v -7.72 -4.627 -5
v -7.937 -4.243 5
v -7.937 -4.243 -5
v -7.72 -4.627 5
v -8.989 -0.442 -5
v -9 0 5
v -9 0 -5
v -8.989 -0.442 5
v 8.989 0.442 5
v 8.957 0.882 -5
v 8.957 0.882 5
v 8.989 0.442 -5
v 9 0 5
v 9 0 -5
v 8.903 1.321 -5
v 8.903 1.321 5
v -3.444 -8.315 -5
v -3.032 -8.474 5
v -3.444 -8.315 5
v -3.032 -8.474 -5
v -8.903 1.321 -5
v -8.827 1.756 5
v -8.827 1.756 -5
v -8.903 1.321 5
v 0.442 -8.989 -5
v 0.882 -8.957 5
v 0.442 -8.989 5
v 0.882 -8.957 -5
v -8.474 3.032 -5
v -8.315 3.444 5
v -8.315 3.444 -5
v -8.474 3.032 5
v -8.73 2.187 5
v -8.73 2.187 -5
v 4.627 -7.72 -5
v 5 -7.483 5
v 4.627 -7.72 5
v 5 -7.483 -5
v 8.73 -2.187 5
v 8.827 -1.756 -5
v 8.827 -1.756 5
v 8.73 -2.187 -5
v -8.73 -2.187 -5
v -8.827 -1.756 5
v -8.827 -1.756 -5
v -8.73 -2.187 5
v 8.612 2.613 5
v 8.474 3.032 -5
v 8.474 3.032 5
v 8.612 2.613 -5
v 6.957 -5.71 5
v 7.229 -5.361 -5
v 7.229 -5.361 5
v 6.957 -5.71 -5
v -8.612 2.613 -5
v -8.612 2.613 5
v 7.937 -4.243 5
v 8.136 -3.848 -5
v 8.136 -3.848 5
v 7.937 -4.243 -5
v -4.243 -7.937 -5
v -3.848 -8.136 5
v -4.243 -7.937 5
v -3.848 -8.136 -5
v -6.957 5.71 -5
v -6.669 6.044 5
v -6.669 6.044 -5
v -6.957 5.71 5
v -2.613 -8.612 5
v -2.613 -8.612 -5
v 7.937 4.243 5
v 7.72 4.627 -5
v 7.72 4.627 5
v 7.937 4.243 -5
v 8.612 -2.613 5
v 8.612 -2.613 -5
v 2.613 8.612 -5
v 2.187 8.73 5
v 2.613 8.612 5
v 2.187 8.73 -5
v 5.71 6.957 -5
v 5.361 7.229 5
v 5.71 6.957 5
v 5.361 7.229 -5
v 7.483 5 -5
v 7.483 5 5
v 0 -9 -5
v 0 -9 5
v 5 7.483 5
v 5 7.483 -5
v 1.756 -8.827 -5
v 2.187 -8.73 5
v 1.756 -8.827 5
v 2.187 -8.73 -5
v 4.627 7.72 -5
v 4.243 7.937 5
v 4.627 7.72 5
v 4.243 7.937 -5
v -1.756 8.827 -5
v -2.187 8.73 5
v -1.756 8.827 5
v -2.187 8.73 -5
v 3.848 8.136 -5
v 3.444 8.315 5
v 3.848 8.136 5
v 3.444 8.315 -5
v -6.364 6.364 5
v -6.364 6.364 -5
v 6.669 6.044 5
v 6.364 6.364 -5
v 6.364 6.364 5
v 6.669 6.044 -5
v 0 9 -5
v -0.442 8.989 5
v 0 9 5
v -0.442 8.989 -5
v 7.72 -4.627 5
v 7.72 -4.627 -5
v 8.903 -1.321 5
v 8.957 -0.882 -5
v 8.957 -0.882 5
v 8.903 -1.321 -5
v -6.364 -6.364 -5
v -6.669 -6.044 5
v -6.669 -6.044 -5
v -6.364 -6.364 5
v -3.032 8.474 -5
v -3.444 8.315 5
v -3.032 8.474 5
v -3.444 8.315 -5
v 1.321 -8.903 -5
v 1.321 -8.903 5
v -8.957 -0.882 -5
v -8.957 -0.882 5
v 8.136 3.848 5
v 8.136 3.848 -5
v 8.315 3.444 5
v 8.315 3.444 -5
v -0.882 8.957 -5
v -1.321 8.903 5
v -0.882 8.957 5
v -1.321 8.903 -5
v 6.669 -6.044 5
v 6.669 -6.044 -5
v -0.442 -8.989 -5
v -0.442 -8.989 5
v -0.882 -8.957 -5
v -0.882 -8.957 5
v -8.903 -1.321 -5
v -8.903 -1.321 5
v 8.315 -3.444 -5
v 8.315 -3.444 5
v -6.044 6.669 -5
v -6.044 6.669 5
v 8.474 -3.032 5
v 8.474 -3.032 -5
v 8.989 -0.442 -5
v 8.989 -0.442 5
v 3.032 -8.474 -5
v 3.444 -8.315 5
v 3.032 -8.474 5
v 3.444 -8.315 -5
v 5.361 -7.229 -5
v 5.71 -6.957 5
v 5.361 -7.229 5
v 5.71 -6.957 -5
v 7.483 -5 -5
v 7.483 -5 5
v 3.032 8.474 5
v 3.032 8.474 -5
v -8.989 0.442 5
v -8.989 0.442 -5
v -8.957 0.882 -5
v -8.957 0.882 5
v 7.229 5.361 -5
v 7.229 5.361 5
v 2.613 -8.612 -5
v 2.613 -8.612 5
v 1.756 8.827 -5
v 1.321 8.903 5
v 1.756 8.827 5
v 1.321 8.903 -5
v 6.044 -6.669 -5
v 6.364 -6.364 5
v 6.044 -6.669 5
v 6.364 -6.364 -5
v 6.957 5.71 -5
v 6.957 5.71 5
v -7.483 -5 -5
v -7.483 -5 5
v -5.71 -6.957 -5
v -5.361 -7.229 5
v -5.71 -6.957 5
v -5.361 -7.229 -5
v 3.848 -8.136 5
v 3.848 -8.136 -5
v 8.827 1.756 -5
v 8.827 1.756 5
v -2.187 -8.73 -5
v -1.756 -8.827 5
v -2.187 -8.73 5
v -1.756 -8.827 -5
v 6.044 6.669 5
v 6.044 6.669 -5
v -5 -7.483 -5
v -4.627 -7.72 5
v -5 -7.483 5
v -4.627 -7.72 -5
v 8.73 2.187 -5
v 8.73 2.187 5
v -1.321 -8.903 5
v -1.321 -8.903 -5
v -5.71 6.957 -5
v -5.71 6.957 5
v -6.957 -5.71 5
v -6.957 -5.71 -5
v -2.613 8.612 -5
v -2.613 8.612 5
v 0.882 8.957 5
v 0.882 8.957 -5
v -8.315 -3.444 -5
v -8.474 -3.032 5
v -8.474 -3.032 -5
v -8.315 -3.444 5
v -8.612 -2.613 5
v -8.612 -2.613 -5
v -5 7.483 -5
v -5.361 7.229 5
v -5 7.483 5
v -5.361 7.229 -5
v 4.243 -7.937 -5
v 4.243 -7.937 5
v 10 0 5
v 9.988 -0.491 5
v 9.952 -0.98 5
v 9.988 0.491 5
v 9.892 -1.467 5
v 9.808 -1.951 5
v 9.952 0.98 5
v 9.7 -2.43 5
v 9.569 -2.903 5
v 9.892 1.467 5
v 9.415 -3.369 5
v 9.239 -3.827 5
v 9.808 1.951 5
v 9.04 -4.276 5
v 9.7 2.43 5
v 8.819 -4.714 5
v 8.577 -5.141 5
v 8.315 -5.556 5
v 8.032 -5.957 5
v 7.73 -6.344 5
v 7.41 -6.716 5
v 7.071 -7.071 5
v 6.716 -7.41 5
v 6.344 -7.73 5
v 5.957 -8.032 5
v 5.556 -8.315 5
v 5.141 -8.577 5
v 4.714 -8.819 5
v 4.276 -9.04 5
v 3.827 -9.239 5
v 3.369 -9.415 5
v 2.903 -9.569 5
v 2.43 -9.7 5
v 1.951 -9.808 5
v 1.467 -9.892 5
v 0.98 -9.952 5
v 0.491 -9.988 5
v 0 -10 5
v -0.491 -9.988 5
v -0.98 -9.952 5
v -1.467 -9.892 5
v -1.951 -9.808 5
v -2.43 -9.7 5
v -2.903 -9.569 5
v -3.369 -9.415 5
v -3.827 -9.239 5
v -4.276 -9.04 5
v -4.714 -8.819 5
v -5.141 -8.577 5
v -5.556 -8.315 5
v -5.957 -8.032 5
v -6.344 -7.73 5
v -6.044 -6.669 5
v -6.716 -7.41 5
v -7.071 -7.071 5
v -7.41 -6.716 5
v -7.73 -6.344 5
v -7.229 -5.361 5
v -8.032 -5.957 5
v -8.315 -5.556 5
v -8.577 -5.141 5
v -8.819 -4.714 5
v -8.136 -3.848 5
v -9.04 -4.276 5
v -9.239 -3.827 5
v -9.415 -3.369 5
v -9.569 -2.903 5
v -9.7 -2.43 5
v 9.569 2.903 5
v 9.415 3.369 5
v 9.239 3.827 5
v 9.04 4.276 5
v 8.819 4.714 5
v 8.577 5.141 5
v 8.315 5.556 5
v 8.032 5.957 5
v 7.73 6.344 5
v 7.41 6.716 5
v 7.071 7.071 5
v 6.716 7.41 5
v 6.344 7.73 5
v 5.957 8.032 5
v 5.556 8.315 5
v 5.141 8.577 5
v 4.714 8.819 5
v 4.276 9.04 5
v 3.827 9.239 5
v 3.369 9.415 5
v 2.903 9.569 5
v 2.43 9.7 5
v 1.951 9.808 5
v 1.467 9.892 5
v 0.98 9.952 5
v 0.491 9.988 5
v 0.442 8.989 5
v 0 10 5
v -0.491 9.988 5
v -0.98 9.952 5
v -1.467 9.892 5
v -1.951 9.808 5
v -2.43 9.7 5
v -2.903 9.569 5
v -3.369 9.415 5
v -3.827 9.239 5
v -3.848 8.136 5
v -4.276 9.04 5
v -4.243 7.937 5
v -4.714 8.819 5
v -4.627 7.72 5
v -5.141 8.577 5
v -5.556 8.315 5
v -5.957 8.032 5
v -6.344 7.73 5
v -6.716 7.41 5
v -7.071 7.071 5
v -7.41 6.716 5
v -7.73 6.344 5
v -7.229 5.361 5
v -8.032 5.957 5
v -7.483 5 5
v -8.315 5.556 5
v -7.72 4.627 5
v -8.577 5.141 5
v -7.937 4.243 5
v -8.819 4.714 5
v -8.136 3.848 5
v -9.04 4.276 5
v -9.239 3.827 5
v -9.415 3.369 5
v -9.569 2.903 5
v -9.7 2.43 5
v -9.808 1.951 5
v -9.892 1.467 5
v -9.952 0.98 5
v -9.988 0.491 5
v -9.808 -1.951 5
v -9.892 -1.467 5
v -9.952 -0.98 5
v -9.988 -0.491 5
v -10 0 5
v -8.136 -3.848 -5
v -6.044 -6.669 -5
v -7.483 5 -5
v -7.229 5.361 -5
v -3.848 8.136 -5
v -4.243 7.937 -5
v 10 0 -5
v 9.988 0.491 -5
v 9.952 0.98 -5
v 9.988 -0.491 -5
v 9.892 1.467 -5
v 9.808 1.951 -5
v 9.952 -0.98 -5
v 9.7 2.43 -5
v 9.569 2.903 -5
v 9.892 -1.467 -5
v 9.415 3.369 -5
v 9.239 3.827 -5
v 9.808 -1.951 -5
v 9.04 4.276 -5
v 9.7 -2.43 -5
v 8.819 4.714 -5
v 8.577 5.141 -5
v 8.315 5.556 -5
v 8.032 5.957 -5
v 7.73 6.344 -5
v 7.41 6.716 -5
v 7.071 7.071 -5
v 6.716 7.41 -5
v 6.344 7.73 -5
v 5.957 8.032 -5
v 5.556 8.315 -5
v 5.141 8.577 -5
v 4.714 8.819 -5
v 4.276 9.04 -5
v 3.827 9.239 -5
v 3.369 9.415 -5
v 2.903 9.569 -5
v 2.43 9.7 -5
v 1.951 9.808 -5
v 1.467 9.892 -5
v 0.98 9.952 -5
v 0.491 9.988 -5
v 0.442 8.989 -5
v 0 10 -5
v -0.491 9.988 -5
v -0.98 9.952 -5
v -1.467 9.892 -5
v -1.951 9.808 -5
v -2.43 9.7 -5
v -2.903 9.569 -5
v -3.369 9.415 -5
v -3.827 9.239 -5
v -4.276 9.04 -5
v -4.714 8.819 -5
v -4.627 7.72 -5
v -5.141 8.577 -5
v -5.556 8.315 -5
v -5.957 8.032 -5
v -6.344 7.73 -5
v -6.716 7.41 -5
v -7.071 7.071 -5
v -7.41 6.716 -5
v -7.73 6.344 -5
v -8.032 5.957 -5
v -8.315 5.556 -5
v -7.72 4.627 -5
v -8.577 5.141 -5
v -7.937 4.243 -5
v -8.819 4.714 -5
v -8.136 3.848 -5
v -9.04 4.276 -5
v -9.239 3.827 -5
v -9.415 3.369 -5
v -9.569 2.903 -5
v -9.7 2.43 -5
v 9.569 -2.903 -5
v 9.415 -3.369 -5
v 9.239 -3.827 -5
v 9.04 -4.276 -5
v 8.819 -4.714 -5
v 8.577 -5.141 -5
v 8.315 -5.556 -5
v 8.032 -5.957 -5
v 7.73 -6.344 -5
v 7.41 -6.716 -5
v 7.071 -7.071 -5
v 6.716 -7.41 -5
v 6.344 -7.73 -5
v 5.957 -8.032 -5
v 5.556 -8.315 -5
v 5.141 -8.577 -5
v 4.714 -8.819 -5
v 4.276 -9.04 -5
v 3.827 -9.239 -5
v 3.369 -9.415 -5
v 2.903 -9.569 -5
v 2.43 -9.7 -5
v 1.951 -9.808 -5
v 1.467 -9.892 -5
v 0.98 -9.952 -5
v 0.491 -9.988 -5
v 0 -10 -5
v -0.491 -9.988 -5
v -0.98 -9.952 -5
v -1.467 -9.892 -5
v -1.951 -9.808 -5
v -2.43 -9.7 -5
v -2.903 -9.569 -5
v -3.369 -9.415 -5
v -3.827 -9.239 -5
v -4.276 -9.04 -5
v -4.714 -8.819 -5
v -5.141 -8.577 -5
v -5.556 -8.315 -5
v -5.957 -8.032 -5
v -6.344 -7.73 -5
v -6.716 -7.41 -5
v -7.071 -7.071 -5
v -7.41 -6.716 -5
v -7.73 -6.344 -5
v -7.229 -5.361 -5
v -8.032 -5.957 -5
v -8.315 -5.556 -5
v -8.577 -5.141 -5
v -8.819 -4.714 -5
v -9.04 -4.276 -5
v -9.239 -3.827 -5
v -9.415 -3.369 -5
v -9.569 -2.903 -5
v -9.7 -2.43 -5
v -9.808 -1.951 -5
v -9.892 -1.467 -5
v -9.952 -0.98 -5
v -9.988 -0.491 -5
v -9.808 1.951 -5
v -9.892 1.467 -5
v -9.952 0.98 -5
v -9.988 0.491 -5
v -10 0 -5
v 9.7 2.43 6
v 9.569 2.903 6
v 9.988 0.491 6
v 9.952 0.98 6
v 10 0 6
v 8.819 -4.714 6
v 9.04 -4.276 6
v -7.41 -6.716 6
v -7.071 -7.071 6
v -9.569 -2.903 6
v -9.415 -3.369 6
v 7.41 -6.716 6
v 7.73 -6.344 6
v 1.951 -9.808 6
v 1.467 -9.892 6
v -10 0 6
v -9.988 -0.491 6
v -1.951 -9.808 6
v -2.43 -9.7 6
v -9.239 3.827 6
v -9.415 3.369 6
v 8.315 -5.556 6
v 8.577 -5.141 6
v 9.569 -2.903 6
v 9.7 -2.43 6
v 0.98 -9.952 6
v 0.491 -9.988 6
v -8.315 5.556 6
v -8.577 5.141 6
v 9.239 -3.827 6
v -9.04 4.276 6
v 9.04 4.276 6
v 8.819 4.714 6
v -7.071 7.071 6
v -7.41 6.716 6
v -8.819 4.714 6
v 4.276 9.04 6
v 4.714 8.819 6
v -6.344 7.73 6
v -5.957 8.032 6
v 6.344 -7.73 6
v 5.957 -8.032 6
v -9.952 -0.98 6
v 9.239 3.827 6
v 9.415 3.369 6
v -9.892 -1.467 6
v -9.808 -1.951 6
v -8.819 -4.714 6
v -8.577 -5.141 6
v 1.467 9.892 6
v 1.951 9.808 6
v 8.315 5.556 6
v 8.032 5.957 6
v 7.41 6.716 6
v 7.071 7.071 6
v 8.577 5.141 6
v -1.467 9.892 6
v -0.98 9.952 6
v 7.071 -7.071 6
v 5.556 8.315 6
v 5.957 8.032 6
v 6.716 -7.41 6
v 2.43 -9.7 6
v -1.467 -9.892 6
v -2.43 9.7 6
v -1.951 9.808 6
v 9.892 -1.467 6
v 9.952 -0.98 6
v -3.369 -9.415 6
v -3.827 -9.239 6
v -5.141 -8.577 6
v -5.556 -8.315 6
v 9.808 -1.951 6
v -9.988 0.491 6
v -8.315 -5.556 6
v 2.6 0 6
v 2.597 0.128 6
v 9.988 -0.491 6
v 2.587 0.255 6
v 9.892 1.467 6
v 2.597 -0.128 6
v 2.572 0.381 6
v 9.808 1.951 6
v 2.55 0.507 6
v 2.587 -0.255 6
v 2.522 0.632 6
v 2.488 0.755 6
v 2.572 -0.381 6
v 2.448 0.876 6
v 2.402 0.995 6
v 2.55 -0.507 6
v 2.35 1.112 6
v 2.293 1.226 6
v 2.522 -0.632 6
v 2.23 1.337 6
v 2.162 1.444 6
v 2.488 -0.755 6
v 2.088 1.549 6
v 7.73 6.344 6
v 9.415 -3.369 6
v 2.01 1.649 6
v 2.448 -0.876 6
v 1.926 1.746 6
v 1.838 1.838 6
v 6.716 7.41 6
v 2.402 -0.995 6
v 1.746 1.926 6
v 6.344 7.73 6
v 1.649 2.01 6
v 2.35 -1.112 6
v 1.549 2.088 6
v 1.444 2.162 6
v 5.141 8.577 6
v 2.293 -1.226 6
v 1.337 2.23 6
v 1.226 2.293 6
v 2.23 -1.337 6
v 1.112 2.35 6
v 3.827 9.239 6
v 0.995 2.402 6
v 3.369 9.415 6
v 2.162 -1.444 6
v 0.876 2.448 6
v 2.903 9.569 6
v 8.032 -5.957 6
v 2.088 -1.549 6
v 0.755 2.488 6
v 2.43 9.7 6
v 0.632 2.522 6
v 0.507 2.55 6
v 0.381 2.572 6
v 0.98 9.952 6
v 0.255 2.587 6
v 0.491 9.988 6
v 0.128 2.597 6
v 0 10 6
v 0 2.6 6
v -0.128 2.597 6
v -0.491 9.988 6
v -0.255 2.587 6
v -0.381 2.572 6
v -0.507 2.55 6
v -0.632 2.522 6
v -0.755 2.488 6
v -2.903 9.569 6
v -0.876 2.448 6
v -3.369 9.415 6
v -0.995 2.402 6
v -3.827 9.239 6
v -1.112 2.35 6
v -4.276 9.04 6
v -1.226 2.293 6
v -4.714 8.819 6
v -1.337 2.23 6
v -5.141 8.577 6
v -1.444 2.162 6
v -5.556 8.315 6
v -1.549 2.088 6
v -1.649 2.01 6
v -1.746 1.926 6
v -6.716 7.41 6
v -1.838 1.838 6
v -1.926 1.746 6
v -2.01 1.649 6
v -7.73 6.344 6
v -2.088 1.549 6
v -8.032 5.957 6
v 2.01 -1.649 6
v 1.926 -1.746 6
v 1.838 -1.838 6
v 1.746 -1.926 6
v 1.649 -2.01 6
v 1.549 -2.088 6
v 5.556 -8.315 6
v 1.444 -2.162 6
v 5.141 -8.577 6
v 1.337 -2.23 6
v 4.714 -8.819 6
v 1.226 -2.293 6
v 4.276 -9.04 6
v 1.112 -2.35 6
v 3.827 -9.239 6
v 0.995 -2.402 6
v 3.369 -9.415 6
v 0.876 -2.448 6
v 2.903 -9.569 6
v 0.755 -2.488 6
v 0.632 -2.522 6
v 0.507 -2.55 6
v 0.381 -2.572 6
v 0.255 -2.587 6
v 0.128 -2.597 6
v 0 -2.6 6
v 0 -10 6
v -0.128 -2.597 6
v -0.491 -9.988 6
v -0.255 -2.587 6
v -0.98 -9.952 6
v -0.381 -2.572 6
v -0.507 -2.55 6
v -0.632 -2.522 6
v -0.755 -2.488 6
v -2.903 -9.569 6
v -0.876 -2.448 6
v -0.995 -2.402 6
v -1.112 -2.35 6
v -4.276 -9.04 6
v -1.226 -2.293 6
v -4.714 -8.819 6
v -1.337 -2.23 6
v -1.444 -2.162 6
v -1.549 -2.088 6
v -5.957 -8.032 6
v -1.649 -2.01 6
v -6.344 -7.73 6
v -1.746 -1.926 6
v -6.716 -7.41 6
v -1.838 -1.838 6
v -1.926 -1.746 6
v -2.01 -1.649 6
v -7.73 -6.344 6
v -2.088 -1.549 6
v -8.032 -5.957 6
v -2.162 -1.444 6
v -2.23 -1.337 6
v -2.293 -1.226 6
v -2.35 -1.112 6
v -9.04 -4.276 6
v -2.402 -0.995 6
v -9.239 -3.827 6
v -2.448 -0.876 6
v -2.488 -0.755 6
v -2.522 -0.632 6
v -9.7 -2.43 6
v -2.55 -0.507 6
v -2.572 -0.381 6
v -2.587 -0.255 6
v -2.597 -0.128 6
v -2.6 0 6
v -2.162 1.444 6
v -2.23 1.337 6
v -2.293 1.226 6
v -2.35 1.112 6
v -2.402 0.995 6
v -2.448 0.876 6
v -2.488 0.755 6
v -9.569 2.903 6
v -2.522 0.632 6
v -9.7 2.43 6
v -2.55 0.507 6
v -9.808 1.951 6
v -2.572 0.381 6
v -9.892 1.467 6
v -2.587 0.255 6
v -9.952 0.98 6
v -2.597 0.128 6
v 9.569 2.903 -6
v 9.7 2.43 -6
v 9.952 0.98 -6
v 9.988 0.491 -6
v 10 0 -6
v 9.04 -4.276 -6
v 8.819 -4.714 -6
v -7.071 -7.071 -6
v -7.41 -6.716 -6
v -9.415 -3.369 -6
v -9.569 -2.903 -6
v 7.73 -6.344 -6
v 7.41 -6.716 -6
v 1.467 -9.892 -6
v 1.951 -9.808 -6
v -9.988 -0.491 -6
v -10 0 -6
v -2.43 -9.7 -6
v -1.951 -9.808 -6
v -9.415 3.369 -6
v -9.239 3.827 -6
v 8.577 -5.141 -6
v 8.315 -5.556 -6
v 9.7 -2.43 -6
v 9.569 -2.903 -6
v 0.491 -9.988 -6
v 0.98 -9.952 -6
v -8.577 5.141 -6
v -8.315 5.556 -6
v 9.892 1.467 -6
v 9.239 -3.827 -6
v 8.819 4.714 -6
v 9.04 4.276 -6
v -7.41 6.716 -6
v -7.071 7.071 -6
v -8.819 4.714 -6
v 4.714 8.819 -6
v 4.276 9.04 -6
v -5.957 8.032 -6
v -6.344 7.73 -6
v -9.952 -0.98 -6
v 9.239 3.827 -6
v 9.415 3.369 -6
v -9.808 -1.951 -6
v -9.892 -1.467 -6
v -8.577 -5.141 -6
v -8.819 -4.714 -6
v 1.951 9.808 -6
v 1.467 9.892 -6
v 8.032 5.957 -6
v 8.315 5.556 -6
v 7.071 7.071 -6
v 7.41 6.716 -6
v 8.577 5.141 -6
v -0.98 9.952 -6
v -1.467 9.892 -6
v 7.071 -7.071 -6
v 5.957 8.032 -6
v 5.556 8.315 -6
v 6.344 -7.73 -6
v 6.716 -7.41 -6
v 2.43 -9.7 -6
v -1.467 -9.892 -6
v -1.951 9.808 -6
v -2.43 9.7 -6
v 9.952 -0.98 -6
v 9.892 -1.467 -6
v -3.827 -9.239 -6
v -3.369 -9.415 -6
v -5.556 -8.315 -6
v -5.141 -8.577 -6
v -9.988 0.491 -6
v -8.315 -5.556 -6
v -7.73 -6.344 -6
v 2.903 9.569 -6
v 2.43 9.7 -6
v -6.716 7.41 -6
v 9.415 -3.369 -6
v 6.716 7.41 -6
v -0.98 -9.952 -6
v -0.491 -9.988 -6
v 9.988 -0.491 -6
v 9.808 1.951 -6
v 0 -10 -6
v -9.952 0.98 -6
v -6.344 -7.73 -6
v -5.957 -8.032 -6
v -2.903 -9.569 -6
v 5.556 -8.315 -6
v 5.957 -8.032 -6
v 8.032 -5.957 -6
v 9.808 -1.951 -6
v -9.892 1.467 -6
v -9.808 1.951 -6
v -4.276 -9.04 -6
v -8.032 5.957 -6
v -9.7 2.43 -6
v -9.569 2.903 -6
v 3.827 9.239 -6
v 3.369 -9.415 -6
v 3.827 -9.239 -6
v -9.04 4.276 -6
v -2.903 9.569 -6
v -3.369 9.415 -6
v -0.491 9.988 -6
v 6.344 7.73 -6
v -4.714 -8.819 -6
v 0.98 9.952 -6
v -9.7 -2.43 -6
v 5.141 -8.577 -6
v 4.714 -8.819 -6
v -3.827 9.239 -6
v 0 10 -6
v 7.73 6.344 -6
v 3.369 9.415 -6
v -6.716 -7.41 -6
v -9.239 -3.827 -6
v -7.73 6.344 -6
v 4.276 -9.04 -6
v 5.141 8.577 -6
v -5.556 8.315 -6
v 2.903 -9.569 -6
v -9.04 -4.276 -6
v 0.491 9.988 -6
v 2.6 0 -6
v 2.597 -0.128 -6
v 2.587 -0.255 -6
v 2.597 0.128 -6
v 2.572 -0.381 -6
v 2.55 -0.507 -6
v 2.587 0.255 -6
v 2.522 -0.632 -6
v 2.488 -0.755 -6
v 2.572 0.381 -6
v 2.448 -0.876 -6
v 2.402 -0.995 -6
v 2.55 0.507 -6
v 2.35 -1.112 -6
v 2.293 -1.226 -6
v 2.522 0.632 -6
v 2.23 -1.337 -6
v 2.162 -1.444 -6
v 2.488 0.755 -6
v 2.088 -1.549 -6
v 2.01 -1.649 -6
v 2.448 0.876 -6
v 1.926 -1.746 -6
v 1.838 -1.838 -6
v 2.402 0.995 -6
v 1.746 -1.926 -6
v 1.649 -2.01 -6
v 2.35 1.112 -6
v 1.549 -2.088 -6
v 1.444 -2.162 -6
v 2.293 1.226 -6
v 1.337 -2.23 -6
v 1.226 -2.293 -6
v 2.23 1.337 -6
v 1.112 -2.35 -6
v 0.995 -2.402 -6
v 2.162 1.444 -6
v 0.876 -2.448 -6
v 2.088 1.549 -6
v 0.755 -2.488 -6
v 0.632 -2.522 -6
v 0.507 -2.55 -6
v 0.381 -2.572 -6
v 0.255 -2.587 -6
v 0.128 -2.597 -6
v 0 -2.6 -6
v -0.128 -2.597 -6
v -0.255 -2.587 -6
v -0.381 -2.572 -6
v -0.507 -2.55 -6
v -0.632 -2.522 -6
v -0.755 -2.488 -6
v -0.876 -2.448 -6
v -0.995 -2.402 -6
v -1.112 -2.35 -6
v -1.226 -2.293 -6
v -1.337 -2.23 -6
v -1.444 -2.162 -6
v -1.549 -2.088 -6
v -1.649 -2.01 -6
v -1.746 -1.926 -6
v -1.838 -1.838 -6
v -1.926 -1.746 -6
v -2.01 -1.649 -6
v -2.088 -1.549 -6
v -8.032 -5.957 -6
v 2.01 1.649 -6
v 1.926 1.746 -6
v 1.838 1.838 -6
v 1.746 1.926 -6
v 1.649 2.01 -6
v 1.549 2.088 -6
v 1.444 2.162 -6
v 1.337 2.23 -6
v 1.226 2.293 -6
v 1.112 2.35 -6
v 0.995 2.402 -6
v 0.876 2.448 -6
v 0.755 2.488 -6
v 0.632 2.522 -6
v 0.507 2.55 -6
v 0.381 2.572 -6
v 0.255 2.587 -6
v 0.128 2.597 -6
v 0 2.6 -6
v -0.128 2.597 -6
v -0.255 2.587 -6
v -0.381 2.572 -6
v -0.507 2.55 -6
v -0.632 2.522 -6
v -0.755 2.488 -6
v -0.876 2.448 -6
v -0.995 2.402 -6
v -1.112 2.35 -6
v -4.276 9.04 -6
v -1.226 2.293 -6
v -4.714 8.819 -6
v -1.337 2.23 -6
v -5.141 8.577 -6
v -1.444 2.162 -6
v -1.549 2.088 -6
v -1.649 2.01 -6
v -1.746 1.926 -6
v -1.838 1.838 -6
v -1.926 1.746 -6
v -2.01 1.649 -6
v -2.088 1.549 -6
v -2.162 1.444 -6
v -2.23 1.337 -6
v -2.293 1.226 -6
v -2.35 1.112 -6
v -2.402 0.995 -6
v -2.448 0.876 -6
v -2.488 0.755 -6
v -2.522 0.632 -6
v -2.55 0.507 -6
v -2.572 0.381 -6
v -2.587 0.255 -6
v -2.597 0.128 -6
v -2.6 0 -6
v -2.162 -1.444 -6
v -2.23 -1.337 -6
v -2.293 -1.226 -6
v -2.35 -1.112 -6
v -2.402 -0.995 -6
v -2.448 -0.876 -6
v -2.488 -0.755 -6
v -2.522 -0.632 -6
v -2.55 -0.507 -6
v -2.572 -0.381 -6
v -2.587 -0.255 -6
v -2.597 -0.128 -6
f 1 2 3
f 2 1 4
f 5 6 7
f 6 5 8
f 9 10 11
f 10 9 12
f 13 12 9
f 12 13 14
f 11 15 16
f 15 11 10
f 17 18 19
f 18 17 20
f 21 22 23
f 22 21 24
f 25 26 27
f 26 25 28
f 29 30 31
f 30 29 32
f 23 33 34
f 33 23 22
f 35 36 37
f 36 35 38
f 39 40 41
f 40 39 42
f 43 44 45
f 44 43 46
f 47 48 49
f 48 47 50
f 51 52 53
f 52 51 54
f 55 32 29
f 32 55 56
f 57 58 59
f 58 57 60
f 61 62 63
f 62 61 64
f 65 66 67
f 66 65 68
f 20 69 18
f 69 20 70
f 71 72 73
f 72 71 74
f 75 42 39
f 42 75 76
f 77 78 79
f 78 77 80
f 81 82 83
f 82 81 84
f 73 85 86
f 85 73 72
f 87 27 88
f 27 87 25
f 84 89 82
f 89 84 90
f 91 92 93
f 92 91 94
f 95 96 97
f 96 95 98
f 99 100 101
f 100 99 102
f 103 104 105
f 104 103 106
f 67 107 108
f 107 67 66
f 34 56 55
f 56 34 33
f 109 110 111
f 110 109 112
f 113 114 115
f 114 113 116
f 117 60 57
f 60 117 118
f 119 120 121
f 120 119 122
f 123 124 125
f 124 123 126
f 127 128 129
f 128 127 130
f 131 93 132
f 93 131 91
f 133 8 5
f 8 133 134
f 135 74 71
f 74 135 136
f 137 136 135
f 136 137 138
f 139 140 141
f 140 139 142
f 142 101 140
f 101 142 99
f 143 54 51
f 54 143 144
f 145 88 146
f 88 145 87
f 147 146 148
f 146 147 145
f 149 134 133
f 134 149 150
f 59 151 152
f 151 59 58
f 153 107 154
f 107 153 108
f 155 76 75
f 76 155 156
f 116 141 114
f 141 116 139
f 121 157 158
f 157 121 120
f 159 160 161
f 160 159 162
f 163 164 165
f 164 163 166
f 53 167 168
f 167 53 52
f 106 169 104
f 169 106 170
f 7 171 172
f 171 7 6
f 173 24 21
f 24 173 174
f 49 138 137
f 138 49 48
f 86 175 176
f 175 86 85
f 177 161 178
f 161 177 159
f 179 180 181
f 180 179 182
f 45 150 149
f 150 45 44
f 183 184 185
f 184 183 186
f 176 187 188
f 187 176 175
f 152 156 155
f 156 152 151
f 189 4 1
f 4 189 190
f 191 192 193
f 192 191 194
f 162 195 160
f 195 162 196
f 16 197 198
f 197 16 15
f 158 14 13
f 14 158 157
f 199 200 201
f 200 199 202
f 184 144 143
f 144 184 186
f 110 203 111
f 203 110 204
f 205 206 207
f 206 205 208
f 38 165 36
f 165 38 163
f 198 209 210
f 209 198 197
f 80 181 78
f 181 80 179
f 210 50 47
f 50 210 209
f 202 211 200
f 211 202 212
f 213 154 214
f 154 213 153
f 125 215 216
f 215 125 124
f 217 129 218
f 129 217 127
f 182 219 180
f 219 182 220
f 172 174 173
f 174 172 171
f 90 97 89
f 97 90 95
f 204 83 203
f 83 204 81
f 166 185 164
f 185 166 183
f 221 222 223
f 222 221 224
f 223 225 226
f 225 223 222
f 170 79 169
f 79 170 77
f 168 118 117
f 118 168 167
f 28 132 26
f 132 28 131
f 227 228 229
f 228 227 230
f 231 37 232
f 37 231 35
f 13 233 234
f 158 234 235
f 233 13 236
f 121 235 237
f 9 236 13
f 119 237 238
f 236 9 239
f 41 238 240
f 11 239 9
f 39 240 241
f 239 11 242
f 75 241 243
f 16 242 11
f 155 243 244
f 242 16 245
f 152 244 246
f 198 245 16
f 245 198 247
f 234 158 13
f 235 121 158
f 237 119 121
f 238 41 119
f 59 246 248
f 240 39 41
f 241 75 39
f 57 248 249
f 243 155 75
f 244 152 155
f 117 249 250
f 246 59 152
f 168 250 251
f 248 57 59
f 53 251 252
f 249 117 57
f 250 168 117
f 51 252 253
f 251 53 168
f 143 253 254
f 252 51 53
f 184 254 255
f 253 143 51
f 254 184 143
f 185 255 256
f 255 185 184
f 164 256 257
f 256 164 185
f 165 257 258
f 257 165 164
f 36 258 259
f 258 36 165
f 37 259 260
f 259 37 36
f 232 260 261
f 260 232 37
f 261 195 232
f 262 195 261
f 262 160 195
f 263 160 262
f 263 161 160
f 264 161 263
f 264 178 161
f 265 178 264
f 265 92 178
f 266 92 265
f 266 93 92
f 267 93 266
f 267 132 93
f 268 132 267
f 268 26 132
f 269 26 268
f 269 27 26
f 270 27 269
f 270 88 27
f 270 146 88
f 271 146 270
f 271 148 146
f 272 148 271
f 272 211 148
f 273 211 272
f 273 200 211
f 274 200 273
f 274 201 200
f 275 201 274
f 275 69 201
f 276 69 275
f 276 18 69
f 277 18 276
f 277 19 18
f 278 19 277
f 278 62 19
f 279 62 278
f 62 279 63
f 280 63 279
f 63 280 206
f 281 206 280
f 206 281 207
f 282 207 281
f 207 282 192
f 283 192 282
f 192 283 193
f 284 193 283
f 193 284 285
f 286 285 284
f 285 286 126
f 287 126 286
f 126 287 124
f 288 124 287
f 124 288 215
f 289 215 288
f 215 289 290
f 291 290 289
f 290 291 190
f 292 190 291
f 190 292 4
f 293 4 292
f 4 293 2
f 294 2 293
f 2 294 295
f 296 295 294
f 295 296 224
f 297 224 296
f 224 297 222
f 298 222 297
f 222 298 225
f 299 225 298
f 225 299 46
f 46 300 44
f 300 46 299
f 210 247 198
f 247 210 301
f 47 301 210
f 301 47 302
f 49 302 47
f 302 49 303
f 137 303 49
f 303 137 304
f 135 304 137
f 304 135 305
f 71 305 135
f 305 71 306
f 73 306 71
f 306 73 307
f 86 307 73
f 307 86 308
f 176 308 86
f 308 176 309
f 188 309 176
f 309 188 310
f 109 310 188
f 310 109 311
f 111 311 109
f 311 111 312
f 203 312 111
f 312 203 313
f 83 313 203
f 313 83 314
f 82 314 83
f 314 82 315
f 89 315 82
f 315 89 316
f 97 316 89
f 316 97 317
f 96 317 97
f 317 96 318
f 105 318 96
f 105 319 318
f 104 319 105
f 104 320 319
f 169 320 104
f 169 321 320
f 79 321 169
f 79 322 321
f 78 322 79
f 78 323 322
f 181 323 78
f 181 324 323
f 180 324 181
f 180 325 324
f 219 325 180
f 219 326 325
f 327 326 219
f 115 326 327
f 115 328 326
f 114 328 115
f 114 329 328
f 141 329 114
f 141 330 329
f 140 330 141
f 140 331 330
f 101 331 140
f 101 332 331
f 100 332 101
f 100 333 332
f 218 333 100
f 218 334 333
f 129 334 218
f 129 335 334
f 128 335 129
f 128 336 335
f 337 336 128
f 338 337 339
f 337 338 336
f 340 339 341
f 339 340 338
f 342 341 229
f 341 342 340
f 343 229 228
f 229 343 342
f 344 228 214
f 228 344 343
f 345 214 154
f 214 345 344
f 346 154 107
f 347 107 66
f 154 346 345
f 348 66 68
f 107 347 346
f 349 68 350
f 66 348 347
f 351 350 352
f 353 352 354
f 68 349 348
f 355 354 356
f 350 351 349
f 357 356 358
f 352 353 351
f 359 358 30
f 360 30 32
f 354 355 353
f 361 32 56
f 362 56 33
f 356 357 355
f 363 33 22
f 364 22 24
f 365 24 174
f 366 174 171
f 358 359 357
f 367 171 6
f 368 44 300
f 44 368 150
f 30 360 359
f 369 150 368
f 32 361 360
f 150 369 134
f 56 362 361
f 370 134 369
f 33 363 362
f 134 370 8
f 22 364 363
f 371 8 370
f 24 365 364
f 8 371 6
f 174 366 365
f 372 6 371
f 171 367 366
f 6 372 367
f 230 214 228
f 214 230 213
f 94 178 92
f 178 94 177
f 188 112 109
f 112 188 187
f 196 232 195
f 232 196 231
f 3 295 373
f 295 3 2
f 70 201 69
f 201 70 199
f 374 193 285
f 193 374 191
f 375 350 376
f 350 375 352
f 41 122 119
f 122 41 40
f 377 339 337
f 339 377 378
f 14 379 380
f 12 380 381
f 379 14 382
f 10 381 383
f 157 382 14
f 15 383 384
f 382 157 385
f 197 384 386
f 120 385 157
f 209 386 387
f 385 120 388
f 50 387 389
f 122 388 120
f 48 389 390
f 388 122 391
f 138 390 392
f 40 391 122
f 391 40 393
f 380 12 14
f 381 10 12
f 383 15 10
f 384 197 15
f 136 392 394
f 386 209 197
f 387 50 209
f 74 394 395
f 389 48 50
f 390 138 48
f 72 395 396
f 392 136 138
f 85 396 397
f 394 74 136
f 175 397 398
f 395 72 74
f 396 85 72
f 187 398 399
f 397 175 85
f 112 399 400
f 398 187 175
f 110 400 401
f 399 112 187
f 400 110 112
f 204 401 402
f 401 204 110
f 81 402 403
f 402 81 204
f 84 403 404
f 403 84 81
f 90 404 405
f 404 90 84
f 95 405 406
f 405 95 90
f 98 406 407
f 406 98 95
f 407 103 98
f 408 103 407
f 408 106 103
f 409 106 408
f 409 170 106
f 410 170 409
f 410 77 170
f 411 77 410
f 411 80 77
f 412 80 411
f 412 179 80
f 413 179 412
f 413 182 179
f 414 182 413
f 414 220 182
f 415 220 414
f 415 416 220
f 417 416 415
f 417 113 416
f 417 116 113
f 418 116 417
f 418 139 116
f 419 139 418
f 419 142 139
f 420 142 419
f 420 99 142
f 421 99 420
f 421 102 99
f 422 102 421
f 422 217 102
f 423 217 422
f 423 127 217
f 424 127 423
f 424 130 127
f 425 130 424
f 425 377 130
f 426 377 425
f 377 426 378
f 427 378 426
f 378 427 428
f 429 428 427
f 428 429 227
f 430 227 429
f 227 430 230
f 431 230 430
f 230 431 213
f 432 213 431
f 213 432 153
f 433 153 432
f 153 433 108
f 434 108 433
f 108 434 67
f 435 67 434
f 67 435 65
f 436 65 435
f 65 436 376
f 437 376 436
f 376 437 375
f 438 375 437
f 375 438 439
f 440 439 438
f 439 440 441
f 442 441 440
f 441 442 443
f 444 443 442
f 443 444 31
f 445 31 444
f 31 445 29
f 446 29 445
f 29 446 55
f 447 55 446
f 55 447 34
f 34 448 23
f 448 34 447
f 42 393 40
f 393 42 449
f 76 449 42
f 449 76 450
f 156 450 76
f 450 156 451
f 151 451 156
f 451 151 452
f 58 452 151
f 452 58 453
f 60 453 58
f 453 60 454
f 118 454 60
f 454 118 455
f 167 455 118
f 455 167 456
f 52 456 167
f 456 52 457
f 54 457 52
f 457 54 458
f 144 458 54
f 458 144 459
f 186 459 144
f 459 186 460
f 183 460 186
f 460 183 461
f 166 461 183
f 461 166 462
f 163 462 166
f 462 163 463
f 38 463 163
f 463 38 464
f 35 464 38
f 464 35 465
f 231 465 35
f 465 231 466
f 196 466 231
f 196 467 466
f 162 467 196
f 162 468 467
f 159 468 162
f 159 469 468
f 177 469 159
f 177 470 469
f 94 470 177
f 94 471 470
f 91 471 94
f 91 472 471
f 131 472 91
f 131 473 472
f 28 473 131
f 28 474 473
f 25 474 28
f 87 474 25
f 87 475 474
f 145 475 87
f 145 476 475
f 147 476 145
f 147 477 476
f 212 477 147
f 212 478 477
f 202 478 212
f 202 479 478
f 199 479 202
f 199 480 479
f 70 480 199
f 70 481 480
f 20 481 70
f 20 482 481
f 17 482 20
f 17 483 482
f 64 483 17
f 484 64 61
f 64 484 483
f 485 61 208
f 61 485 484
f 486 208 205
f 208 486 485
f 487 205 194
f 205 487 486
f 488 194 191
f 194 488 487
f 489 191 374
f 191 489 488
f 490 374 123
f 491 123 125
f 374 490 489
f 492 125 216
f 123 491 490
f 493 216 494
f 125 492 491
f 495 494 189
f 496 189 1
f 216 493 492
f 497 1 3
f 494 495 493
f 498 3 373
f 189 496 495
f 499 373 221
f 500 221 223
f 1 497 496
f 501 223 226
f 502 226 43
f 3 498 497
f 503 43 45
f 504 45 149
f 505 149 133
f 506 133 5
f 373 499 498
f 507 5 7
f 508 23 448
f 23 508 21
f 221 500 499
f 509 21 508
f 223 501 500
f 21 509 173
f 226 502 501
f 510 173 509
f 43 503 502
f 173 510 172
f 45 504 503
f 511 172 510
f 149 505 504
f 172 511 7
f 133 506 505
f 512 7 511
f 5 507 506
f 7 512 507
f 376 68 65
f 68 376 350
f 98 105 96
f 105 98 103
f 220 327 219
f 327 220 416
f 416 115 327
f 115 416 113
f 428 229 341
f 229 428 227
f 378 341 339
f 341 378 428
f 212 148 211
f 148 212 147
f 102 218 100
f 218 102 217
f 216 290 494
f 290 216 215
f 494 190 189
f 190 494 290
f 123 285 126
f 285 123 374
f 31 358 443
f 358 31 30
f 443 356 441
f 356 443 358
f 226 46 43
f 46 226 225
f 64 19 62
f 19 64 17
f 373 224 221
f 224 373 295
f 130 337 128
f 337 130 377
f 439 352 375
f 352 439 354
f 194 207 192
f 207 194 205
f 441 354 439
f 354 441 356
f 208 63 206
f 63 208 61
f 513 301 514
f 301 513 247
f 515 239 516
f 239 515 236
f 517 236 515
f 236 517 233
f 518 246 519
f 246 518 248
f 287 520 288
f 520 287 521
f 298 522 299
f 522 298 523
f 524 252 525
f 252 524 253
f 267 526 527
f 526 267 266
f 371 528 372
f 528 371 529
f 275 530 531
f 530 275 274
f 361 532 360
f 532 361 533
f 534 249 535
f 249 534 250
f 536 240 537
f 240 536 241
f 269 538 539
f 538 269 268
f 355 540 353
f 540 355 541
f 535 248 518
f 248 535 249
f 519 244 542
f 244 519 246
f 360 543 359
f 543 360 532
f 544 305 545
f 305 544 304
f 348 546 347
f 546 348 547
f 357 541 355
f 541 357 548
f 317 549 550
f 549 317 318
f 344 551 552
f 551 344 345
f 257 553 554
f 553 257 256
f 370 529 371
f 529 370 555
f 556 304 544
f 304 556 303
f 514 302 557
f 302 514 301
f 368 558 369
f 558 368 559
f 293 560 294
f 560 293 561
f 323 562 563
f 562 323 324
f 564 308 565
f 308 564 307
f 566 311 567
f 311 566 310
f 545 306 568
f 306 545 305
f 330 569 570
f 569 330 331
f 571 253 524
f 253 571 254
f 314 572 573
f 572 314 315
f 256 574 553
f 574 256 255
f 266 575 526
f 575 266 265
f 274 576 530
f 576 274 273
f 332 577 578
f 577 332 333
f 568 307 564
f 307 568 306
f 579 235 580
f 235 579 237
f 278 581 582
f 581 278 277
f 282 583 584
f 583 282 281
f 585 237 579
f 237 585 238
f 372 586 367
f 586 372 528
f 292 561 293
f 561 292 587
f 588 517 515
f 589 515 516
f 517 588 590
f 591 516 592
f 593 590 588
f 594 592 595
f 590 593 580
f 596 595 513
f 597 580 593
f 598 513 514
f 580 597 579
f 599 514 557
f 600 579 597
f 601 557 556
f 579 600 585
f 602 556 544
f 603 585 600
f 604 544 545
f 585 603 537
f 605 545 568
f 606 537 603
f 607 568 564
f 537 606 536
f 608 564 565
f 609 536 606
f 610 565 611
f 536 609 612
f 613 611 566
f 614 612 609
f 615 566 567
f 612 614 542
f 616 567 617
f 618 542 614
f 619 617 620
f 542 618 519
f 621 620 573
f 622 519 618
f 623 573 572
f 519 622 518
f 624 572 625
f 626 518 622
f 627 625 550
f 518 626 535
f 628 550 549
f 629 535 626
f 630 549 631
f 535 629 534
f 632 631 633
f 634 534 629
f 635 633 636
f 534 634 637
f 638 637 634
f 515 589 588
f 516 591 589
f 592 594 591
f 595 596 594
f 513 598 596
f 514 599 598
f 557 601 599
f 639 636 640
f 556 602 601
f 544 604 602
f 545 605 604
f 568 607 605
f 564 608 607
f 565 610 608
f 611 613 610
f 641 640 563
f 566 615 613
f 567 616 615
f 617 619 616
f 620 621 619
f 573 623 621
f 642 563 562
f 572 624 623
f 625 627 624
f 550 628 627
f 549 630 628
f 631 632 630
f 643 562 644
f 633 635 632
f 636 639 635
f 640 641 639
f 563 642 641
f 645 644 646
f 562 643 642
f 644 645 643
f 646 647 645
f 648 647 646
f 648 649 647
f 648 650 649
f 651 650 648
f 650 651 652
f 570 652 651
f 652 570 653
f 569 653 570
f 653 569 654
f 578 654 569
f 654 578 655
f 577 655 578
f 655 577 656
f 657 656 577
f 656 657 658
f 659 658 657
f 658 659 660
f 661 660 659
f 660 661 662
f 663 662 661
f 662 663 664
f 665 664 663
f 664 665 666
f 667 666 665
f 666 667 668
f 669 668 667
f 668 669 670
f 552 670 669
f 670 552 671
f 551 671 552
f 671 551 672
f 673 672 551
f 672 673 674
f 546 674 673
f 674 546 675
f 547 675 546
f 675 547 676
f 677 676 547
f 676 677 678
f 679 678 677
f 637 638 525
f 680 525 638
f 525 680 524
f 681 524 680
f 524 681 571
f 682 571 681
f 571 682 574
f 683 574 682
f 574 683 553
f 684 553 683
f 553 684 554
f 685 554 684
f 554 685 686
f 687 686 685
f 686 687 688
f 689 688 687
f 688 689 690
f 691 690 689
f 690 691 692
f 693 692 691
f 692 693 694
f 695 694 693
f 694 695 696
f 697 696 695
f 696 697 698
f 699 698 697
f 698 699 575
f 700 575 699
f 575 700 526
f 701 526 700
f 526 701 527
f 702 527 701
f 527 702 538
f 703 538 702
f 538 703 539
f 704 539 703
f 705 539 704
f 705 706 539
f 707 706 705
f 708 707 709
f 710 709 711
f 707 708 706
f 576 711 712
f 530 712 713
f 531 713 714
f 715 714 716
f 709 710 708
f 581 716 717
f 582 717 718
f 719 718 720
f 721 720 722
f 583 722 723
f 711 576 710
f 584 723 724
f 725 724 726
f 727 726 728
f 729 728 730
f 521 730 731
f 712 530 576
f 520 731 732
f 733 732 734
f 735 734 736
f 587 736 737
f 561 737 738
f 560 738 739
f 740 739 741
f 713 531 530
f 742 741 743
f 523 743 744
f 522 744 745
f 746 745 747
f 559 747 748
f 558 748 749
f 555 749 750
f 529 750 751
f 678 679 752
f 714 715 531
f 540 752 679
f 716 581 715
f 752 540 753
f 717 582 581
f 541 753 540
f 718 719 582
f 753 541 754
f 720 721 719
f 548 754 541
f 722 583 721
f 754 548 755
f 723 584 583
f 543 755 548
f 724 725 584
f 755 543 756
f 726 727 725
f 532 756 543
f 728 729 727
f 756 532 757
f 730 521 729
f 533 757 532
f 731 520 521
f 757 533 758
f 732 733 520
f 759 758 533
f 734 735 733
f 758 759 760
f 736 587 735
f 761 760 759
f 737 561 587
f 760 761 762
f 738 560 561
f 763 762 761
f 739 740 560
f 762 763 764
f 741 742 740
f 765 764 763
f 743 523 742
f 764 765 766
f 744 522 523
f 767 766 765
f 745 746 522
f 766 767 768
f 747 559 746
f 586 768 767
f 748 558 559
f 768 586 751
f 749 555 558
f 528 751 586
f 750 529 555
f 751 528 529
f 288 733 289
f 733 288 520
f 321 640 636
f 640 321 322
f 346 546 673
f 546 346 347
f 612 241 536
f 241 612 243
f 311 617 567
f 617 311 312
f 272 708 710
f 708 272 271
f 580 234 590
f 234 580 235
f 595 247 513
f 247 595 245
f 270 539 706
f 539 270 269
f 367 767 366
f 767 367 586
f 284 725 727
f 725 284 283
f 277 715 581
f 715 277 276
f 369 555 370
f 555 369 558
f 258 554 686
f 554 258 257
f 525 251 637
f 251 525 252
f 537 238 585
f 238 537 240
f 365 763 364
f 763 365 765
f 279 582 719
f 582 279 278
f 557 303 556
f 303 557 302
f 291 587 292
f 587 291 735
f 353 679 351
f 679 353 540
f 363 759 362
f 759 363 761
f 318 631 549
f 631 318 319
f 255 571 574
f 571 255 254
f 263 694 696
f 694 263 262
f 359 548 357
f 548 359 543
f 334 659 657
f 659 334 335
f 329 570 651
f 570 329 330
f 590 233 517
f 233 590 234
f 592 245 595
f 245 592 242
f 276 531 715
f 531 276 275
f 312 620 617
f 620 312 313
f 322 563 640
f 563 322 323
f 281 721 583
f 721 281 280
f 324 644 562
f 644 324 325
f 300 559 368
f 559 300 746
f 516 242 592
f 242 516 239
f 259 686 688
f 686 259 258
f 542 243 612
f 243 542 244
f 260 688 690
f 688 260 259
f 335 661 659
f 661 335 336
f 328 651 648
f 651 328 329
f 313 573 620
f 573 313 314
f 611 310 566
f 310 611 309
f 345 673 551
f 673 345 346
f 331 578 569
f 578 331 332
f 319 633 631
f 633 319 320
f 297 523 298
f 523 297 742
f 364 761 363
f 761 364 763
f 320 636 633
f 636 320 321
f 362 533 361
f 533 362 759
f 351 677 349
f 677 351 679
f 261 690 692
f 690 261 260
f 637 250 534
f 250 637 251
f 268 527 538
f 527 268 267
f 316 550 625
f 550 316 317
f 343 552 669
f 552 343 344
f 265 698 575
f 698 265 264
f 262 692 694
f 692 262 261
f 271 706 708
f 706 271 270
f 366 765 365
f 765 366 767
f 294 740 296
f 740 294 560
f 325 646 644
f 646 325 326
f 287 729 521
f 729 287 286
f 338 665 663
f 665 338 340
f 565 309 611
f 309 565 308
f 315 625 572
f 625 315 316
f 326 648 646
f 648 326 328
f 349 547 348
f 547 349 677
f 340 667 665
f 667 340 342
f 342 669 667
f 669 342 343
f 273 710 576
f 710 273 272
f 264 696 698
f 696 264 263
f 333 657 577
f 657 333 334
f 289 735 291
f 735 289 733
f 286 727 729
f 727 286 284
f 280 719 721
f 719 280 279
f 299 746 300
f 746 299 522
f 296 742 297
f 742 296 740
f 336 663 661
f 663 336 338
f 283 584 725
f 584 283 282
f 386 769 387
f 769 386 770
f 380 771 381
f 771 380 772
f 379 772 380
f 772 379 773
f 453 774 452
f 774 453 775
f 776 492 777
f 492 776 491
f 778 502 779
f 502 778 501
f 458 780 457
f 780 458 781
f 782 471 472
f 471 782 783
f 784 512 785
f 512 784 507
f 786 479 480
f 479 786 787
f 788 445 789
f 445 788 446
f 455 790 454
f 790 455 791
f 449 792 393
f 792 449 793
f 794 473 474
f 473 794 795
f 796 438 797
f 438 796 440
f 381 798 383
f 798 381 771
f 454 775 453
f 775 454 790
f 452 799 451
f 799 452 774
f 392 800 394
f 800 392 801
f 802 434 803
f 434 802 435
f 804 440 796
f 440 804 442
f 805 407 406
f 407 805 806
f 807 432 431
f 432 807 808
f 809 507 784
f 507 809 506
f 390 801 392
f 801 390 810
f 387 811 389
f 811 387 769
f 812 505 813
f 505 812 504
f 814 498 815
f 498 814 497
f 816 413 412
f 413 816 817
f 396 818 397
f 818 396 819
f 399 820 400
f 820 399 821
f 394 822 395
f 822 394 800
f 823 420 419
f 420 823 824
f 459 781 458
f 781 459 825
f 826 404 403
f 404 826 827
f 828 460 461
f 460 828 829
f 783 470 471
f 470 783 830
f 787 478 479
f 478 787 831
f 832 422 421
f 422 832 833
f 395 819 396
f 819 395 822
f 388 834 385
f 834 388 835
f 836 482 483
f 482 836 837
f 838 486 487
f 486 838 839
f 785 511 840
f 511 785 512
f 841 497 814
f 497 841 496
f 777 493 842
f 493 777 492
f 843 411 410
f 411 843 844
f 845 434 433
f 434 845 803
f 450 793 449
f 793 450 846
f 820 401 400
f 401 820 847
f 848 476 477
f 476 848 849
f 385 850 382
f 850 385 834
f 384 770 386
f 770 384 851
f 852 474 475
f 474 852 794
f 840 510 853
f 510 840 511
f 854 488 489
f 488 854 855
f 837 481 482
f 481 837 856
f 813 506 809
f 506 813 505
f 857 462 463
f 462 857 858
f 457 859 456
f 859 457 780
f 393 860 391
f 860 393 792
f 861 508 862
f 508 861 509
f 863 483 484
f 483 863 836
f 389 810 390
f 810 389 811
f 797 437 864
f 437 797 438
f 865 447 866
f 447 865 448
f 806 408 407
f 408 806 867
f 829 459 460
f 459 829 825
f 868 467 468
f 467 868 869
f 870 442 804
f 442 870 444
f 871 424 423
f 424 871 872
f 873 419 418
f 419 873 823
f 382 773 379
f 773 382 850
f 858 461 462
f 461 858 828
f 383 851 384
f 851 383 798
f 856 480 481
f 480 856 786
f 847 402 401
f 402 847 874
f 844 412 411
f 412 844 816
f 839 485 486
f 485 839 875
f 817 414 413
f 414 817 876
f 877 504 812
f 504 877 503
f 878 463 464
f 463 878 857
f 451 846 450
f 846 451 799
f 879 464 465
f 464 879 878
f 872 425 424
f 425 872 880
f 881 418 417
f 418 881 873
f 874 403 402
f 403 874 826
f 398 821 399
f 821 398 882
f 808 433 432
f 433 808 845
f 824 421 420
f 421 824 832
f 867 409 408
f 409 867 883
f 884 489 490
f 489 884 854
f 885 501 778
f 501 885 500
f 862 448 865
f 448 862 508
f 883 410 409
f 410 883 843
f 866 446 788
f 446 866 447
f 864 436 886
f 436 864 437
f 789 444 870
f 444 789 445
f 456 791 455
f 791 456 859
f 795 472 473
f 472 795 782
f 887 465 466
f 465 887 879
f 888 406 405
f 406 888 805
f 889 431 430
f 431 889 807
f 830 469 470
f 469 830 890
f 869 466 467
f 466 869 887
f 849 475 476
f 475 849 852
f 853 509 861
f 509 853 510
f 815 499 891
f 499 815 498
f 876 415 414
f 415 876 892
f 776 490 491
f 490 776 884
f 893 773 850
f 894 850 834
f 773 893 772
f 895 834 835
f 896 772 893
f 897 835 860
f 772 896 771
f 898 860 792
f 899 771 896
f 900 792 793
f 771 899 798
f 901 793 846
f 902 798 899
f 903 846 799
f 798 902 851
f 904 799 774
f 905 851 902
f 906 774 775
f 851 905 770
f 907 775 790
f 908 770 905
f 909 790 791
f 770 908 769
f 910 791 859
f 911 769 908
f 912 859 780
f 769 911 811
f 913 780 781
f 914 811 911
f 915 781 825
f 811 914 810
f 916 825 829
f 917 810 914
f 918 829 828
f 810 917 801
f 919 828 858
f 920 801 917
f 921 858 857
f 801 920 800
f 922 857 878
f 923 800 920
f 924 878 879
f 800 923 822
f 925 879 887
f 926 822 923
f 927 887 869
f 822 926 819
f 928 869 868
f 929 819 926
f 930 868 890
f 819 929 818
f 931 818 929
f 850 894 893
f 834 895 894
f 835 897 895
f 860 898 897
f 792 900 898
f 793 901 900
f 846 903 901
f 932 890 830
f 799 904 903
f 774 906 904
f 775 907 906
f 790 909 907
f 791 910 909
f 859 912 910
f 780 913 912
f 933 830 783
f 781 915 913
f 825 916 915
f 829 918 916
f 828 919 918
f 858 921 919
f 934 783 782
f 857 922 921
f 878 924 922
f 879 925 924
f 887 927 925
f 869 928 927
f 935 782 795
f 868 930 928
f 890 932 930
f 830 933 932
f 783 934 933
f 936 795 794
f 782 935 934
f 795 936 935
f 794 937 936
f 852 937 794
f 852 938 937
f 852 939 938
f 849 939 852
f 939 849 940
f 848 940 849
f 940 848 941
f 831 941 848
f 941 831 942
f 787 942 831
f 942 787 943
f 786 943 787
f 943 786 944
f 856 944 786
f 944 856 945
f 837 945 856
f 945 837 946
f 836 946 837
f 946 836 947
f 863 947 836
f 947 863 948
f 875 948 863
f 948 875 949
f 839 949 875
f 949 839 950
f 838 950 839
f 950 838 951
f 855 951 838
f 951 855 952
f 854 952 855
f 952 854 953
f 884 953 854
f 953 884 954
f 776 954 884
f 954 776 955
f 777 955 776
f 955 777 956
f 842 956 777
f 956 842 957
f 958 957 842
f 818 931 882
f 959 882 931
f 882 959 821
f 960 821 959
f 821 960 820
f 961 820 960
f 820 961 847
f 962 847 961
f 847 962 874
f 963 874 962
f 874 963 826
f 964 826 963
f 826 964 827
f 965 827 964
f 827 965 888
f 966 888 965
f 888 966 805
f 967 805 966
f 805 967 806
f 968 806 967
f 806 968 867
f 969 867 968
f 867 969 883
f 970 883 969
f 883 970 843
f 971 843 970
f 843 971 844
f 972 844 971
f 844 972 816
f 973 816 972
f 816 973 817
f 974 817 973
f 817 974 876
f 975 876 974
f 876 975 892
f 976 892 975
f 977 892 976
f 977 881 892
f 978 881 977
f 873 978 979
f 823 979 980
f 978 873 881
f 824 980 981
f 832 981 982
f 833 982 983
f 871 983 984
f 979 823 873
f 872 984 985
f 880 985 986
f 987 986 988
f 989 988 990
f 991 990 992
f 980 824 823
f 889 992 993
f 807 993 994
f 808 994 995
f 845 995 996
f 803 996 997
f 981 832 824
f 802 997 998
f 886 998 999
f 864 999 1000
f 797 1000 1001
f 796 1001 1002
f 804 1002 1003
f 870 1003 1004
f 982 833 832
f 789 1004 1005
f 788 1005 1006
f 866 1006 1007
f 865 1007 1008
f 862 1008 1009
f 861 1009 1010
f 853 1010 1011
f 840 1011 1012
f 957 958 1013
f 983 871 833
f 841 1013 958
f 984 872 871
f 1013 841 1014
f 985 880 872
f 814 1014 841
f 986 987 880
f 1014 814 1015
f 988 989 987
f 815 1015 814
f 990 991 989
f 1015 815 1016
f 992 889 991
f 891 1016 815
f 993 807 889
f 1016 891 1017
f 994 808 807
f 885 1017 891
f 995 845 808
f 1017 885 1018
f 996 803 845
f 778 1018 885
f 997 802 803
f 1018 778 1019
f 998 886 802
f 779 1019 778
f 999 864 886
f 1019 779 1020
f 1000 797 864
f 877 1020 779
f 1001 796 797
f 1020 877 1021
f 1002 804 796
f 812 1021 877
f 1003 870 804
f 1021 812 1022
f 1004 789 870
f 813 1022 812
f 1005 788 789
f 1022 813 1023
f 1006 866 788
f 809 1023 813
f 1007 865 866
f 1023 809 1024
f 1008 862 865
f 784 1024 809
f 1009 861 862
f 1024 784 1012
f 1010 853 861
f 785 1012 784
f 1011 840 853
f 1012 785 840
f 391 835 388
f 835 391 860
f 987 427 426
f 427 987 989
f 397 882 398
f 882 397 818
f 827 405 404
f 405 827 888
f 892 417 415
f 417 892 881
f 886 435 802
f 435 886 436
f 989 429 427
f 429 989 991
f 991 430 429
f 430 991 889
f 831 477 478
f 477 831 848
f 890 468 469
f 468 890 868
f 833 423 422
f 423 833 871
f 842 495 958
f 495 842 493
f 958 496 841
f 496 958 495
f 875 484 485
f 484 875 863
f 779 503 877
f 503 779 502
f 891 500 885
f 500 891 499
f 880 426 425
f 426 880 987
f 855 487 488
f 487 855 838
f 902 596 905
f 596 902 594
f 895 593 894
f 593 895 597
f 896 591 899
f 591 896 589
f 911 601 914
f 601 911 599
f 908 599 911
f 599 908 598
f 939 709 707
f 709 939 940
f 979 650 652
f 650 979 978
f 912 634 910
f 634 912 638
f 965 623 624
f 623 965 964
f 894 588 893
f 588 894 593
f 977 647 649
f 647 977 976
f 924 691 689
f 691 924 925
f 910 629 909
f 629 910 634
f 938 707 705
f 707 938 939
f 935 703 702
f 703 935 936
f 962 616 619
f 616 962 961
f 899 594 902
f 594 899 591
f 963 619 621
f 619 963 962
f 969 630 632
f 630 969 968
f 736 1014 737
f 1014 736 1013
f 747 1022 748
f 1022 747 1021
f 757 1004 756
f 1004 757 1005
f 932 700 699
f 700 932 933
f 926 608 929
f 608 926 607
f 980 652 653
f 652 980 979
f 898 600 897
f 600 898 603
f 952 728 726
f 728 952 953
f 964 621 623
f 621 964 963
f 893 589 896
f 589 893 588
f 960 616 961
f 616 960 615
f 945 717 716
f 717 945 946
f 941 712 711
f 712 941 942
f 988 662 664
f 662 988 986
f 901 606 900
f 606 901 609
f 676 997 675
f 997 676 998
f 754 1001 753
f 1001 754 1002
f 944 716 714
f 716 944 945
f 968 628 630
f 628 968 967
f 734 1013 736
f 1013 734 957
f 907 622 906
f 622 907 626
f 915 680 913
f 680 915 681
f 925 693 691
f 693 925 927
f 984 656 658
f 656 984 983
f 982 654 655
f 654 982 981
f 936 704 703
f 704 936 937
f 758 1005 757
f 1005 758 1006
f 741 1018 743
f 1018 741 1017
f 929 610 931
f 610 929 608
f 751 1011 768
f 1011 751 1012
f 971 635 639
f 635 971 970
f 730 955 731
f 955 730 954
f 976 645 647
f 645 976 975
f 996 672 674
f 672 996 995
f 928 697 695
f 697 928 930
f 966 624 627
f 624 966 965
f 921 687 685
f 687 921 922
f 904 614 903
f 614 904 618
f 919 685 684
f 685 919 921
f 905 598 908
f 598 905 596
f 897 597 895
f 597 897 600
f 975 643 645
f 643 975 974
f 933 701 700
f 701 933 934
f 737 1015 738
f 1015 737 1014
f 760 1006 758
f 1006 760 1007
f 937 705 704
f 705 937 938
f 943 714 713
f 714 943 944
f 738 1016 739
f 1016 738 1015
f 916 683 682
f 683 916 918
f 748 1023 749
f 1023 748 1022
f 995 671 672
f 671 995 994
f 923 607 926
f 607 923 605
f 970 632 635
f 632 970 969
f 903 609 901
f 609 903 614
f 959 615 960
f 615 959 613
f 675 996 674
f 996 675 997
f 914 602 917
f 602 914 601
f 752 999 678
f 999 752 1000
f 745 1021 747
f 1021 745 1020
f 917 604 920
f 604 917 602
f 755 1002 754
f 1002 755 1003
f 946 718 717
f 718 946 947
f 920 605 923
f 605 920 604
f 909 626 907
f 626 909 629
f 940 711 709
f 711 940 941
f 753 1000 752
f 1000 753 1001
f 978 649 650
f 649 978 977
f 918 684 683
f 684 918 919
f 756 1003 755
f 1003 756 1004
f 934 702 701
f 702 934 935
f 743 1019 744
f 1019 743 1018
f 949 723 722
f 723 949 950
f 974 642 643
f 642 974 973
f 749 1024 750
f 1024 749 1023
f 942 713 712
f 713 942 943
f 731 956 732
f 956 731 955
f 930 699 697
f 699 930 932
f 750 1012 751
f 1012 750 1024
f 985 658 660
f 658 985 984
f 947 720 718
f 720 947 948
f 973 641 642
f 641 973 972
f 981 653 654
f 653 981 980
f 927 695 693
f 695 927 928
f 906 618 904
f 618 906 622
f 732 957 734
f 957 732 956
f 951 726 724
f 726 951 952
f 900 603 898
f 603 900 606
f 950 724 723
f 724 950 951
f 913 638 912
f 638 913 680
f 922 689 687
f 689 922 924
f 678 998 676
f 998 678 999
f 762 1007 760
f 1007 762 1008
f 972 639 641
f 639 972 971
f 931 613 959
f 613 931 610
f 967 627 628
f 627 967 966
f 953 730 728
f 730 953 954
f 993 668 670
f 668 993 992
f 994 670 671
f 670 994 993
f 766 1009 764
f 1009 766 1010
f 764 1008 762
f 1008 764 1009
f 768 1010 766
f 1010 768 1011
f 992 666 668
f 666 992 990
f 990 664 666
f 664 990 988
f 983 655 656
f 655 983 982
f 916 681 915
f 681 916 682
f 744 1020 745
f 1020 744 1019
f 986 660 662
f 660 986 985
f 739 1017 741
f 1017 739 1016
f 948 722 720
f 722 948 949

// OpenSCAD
$fn=128;

teeth = 10;
pitch_d = 15.0;
pitch_r = pitch_d/2;

pulley_width = 10.0;

tooth_height = 1.2;
tooth_tip_width = 1.2;
tooth_root_width = 2.2;

clearance = 0.2;

bore_d = 5.0;

hub_d = 18.0;
hub_width = pulley_width;

flange_d = 20.0;
flange_thk = 1.0;

module tooth2d(r, h, w_root, w_tip){
    polygon(points=[
        [r, -w_root/2],
        [r,  w_root/2],
        [r+h,  w_tip/2],
        [r+h, -w_tip/2]
    ]);
}

module pulley_body(){
    union(){
        cylinder(d=hub_d, h=hub_width, center=true);
        translate([0,0, hub_width/2 + flange_thk/2]) cylinder(d=flange_d, h=flange_thk, center=true);
        translate([0,0,-hub_width/2 - flange_thk/2]) cylinder(d=flange_d, h=flange_thk, center=true);
    }
}

module teeth_ring(){
    for(i=[0:teeth-1]){
        rotate([0,0, i*360/teeth])
            linear_extrude(height=pulley_width, center=true, convexity=10)
                tooth2d(pitch_r - tooth_height/2, tooth_height, tooth_root_width, tooth_tip_width);
    }
}

difference(){
    union(){
        pulley_body();
        teeth_ring();
    }
    cylinder(d=bore_d+clearance, h=hub_width + 2*flange_thk + 2, center=true);
}
